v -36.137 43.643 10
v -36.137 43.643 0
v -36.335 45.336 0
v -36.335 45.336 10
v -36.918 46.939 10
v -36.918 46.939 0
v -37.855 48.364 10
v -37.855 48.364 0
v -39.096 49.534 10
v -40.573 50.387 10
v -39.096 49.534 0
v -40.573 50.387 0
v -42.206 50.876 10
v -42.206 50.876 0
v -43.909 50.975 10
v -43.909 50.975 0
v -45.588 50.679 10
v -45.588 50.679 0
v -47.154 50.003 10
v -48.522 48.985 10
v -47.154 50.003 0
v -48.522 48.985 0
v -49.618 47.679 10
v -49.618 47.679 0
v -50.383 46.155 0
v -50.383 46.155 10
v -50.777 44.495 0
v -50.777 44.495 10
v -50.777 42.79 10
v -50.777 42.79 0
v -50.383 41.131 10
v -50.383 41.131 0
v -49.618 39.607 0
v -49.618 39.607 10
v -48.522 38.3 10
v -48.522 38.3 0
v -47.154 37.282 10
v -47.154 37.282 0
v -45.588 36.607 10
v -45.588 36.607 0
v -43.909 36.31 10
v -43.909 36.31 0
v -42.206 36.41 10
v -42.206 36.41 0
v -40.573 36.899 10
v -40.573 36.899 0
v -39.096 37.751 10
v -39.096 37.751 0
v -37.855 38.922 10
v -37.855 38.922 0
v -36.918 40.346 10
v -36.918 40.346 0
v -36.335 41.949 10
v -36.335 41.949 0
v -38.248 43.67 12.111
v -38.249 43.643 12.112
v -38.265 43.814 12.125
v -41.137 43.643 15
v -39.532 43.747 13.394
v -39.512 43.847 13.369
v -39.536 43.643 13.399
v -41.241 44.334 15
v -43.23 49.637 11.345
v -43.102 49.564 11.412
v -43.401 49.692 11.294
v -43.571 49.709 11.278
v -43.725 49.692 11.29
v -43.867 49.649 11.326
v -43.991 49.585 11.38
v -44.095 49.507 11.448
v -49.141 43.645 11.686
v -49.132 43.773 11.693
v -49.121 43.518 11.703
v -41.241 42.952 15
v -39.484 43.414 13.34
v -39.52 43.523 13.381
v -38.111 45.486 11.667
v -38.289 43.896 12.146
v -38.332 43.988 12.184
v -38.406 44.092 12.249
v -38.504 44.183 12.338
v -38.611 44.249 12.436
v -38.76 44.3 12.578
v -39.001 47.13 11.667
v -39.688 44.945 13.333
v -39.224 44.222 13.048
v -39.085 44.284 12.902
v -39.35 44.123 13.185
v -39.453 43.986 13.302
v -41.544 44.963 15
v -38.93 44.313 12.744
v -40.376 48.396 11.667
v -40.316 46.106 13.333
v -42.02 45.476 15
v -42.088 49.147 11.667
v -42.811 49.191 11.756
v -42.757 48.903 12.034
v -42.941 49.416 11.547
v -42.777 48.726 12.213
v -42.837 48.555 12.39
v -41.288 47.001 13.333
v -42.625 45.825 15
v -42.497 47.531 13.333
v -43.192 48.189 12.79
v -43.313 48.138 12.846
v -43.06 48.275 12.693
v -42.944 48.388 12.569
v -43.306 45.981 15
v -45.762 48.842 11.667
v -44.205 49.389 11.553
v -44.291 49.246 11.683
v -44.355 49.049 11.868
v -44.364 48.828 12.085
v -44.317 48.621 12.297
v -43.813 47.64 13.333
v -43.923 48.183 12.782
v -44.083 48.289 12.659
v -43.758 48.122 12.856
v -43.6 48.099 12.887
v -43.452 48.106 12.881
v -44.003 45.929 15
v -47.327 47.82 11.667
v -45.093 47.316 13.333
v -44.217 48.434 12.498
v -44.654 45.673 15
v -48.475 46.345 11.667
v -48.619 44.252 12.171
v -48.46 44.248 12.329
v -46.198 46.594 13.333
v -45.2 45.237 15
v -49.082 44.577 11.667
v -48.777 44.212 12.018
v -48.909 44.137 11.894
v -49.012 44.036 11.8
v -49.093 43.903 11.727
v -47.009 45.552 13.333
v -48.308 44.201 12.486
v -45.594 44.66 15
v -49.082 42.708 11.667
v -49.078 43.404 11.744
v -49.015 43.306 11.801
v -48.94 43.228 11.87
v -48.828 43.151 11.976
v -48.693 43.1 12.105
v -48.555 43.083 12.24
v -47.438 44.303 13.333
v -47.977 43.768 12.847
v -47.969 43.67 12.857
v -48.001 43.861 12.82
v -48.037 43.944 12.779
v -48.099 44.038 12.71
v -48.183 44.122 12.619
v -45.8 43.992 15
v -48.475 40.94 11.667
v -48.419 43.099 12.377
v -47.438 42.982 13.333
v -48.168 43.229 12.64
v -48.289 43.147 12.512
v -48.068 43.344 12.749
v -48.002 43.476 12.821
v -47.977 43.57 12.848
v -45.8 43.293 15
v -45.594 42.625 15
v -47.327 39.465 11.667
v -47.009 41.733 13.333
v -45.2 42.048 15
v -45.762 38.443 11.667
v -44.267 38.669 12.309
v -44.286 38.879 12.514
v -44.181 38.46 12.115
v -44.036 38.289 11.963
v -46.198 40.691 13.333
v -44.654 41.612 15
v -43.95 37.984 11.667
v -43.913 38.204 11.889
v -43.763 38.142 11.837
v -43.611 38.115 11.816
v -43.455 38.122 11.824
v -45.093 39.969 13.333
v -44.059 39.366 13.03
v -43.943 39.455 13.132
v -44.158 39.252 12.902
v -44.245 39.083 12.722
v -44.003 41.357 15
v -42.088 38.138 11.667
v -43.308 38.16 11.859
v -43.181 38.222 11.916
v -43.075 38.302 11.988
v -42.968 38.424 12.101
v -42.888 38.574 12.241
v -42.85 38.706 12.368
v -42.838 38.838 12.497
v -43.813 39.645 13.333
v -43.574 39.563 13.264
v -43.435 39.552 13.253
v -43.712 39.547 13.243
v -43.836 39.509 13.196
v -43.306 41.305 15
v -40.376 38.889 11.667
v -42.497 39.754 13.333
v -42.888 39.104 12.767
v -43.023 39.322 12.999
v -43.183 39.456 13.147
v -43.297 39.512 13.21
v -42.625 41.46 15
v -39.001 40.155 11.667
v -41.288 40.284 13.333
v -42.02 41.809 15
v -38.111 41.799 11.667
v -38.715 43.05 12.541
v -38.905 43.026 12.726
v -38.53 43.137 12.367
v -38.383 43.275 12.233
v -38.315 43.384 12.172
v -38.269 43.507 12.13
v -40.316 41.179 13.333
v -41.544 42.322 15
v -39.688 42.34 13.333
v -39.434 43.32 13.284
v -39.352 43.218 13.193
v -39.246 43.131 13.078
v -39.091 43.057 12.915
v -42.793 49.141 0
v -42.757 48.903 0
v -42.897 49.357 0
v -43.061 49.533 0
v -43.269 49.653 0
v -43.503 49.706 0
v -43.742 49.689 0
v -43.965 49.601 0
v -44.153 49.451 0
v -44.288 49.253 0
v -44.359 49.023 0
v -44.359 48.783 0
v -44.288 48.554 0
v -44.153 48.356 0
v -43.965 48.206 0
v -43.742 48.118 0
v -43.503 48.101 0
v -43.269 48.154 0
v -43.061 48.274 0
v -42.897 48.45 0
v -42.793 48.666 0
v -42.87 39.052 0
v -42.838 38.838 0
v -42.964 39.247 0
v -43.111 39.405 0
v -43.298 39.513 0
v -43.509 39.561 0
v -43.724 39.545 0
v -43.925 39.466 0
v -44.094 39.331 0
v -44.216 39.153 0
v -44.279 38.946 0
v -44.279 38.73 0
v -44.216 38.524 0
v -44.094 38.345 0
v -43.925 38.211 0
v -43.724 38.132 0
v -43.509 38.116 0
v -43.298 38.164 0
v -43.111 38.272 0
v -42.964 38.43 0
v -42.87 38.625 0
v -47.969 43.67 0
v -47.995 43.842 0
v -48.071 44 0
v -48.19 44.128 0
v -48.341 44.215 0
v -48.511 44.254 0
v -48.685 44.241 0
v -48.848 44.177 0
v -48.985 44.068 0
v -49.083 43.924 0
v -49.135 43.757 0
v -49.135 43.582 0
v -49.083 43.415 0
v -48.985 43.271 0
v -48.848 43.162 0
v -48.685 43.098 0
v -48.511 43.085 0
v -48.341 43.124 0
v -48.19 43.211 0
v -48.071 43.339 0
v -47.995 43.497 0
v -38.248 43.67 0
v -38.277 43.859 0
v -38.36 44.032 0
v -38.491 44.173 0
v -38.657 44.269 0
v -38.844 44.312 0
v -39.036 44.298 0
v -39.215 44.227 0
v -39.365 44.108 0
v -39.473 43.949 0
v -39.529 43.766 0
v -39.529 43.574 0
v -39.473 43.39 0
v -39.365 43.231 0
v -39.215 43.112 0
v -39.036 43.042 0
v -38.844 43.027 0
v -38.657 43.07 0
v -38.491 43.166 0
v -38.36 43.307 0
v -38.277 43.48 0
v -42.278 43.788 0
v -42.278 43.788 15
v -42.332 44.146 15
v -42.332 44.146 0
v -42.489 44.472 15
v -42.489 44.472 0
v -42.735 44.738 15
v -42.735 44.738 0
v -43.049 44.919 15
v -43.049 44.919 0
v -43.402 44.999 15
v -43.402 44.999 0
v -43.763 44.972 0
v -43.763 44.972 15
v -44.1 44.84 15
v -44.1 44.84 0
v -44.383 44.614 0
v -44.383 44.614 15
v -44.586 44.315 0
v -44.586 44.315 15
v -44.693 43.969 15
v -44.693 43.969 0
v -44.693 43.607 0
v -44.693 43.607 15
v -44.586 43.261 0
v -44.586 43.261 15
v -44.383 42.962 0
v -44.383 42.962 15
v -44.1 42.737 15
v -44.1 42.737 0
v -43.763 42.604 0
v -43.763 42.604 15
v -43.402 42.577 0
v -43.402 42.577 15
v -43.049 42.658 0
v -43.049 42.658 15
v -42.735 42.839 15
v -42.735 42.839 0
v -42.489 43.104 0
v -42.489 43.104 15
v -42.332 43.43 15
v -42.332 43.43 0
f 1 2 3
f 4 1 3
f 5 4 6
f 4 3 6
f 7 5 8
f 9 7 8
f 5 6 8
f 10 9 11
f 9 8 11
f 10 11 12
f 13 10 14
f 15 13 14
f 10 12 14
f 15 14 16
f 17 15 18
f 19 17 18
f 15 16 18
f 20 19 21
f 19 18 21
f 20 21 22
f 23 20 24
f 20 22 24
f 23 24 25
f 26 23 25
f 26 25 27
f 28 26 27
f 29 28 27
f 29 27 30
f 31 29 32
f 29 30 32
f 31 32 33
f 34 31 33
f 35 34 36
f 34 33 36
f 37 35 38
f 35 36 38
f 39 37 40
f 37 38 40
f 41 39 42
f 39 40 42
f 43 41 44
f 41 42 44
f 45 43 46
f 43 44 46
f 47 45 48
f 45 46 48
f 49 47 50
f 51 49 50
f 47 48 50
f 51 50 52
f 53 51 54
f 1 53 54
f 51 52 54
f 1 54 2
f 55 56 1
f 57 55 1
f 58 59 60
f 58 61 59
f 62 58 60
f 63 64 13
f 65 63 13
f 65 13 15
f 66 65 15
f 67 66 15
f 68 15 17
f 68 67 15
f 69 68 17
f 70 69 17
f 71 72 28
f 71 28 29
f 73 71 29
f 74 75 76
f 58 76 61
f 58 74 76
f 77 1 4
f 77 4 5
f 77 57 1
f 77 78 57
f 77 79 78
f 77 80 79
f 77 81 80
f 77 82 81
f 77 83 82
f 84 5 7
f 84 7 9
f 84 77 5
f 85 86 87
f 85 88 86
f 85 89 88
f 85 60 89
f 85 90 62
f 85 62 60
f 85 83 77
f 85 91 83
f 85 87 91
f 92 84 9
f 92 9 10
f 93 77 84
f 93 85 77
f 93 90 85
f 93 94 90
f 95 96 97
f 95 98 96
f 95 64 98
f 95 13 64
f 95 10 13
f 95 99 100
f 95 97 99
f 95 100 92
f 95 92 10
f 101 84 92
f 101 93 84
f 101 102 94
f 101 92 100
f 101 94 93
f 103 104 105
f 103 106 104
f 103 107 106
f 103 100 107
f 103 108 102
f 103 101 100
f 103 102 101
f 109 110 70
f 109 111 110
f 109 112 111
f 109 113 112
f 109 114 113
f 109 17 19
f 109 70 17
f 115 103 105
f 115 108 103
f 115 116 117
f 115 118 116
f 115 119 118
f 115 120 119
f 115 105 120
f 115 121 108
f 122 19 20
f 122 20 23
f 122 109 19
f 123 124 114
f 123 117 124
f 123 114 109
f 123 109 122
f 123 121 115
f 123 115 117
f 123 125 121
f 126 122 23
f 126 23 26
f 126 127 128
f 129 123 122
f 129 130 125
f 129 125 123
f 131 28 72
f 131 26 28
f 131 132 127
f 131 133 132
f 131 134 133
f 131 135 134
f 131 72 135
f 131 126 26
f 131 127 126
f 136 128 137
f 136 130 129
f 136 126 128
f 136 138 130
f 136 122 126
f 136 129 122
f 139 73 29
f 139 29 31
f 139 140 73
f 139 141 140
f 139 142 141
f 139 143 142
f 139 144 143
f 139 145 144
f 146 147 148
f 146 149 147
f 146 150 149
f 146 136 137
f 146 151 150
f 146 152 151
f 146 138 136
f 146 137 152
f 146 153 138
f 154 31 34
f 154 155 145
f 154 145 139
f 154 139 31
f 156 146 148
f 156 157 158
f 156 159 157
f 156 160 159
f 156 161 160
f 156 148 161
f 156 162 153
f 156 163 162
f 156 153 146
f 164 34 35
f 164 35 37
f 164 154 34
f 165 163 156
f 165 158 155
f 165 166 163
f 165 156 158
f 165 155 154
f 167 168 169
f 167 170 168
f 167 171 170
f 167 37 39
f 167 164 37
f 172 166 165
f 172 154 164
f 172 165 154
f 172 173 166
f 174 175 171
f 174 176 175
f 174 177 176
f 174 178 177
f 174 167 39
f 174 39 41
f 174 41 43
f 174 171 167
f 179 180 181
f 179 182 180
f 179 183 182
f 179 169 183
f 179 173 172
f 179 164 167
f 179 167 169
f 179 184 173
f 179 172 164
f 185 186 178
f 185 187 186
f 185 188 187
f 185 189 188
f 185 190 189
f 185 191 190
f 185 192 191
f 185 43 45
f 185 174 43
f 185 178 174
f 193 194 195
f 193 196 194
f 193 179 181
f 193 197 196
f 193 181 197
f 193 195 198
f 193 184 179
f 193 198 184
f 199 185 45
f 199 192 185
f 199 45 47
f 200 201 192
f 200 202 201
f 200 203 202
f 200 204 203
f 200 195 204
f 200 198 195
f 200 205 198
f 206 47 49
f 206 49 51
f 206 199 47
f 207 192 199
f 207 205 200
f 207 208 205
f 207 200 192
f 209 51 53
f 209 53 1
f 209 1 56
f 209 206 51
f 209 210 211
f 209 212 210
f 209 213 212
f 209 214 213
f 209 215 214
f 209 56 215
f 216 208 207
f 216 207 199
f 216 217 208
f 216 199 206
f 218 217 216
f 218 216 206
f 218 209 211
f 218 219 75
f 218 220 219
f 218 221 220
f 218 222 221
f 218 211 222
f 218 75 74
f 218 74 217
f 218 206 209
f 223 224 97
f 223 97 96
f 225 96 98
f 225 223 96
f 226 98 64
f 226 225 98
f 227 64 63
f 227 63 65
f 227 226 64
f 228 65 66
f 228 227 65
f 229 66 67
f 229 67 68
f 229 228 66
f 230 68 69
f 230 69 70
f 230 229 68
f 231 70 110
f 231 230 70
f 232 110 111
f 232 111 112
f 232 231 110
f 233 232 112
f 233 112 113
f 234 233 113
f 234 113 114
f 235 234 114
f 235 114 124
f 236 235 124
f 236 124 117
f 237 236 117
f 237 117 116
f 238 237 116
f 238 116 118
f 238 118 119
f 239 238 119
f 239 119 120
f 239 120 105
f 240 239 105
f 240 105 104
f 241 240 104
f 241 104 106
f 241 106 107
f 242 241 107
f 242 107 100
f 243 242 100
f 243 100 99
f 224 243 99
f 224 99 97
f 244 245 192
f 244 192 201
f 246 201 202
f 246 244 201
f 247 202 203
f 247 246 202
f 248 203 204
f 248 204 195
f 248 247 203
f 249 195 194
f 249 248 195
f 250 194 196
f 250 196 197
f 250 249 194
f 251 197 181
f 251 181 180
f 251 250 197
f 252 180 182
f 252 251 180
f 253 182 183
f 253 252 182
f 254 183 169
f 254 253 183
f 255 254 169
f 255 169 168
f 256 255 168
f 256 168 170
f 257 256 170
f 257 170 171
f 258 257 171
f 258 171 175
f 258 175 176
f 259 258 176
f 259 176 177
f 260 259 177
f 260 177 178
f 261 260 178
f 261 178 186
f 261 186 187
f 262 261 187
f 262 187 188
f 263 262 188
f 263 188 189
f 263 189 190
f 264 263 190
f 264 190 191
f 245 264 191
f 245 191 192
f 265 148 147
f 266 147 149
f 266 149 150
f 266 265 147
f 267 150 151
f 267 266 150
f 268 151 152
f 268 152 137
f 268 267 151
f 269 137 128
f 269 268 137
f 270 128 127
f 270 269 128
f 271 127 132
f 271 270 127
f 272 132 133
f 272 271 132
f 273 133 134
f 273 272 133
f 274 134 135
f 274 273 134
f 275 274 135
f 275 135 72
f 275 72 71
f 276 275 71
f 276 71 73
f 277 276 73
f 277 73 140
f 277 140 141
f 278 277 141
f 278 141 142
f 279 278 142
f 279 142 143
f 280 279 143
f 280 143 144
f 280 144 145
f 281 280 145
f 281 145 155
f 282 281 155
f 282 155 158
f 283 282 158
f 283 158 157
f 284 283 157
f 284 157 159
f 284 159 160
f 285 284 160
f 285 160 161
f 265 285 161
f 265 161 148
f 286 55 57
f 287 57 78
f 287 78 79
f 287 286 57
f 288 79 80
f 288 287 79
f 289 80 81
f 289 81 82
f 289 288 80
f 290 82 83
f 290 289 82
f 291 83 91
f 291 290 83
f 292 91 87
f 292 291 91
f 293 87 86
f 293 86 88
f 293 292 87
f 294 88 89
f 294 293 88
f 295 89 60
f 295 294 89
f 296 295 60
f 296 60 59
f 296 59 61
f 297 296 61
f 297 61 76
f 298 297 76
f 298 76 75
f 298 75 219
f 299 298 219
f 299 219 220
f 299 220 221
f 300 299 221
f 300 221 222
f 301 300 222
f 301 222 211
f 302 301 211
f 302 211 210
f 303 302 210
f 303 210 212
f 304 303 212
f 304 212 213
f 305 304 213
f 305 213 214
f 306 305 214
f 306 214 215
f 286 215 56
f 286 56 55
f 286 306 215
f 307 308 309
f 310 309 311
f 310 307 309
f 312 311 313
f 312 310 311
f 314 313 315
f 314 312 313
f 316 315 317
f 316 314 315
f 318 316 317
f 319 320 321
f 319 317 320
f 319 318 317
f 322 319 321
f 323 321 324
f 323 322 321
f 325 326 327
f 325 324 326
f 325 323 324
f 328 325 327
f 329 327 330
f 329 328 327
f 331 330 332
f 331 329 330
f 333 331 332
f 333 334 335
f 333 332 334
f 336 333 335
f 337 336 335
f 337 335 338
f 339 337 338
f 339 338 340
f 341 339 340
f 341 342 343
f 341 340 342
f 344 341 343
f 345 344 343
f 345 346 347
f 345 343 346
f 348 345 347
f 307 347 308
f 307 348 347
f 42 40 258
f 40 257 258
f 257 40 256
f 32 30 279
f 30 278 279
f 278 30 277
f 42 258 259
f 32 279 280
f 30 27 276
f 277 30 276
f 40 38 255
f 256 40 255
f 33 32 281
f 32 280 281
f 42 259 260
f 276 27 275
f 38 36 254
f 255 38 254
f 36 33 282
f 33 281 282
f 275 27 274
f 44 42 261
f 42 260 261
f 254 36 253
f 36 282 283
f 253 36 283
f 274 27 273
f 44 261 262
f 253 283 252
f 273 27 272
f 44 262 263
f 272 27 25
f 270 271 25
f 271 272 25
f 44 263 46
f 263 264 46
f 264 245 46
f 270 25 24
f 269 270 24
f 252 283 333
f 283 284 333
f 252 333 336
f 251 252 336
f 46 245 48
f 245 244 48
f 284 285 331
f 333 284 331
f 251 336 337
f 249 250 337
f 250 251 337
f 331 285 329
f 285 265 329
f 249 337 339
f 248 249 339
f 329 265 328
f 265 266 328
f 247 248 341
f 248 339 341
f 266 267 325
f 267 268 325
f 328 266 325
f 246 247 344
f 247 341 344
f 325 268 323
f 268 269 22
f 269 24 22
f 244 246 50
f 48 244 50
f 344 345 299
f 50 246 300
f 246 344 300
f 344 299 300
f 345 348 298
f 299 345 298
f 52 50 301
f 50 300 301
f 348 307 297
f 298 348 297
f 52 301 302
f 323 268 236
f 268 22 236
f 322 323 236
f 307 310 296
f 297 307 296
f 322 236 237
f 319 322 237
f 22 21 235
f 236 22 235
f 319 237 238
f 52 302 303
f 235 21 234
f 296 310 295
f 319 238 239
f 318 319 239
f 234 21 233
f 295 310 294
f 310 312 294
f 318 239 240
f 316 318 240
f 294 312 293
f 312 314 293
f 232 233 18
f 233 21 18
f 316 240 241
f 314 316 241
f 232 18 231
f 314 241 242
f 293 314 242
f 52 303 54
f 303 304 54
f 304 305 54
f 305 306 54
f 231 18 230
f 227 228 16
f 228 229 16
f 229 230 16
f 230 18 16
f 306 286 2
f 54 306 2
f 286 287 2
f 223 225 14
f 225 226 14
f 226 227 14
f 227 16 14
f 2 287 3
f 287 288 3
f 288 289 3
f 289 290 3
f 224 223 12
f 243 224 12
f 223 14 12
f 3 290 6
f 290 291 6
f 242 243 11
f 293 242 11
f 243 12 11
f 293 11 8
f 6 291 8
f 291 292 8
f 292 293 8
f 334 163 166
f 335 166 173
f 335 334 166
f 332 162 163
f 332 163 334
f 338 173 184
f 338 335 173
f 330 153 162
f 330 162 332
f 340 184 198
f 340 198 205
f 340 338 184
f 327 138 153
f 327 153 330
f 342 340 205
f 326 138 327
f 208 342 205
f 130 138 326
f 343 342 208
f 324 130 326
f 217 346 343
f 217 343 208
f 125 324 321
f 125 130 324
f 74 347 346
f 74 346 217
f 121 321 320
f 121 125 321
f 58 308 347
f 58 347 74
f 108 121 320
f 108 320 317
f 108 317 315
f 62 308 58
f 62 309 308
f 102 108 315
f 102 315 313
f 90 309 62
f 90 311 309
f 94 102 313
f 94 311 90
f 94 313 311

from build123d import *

# Parameters (mm, degrees)
F0_R     = 7.344689
F1_DEPTH = 15
F2_SIZE  = 5
F3_R     = 0.805214
F3_R_2   = 0.724696
F3_R_3   = 0.64417
F3_R_4   = 0.586207
F4_DEPTH = 25
F5_R     = 1.214251
F6_DEPTH = 25


with BuildPart() as f1:
    # F0 (on Top) → F1 (new body)
    with BuildSketch(Plane.XY):
        with Locations((-43.481596, 43.64264)):
            Circle(F0_R)
    extrude(amount=F1_DEPTH)

    # F2
    f2_edges = [f1.edges().sort_by_distance(p)[0] for p in [
        (-50.826285, 43.64264, 15),
    ]]
    chamfer(f2_edges, length=F2_SIZE)

    # F3 (on Top) → F4 (cut)
    with BuildSketch(Plane.XY):
        with Locations((-43.562695, 48.90348)):
            Circle(F3_R)
        with Locations((-43.562695, 38.838297)):
            Circle(F3_R_2)
        with Locations((-38.892448, 43.669585)):
            Circle(F3_R_3)
        with Locations((-48.555028, 43.669585)):
            Circle(F3_R_4)
    extrude(amount=F4_DEPTH, mode=Mode.SUBTRACT)

    # F5 (on Top) → F6 (cut)
    with BuildSketch(Plane.XY):
        with Locations((-43.492485, 43.788202)):
            Circle(F5_R)
    extrude(amount=F6_DEPTH, mode=Mode.SUBTRACT)


solid = f1.part
